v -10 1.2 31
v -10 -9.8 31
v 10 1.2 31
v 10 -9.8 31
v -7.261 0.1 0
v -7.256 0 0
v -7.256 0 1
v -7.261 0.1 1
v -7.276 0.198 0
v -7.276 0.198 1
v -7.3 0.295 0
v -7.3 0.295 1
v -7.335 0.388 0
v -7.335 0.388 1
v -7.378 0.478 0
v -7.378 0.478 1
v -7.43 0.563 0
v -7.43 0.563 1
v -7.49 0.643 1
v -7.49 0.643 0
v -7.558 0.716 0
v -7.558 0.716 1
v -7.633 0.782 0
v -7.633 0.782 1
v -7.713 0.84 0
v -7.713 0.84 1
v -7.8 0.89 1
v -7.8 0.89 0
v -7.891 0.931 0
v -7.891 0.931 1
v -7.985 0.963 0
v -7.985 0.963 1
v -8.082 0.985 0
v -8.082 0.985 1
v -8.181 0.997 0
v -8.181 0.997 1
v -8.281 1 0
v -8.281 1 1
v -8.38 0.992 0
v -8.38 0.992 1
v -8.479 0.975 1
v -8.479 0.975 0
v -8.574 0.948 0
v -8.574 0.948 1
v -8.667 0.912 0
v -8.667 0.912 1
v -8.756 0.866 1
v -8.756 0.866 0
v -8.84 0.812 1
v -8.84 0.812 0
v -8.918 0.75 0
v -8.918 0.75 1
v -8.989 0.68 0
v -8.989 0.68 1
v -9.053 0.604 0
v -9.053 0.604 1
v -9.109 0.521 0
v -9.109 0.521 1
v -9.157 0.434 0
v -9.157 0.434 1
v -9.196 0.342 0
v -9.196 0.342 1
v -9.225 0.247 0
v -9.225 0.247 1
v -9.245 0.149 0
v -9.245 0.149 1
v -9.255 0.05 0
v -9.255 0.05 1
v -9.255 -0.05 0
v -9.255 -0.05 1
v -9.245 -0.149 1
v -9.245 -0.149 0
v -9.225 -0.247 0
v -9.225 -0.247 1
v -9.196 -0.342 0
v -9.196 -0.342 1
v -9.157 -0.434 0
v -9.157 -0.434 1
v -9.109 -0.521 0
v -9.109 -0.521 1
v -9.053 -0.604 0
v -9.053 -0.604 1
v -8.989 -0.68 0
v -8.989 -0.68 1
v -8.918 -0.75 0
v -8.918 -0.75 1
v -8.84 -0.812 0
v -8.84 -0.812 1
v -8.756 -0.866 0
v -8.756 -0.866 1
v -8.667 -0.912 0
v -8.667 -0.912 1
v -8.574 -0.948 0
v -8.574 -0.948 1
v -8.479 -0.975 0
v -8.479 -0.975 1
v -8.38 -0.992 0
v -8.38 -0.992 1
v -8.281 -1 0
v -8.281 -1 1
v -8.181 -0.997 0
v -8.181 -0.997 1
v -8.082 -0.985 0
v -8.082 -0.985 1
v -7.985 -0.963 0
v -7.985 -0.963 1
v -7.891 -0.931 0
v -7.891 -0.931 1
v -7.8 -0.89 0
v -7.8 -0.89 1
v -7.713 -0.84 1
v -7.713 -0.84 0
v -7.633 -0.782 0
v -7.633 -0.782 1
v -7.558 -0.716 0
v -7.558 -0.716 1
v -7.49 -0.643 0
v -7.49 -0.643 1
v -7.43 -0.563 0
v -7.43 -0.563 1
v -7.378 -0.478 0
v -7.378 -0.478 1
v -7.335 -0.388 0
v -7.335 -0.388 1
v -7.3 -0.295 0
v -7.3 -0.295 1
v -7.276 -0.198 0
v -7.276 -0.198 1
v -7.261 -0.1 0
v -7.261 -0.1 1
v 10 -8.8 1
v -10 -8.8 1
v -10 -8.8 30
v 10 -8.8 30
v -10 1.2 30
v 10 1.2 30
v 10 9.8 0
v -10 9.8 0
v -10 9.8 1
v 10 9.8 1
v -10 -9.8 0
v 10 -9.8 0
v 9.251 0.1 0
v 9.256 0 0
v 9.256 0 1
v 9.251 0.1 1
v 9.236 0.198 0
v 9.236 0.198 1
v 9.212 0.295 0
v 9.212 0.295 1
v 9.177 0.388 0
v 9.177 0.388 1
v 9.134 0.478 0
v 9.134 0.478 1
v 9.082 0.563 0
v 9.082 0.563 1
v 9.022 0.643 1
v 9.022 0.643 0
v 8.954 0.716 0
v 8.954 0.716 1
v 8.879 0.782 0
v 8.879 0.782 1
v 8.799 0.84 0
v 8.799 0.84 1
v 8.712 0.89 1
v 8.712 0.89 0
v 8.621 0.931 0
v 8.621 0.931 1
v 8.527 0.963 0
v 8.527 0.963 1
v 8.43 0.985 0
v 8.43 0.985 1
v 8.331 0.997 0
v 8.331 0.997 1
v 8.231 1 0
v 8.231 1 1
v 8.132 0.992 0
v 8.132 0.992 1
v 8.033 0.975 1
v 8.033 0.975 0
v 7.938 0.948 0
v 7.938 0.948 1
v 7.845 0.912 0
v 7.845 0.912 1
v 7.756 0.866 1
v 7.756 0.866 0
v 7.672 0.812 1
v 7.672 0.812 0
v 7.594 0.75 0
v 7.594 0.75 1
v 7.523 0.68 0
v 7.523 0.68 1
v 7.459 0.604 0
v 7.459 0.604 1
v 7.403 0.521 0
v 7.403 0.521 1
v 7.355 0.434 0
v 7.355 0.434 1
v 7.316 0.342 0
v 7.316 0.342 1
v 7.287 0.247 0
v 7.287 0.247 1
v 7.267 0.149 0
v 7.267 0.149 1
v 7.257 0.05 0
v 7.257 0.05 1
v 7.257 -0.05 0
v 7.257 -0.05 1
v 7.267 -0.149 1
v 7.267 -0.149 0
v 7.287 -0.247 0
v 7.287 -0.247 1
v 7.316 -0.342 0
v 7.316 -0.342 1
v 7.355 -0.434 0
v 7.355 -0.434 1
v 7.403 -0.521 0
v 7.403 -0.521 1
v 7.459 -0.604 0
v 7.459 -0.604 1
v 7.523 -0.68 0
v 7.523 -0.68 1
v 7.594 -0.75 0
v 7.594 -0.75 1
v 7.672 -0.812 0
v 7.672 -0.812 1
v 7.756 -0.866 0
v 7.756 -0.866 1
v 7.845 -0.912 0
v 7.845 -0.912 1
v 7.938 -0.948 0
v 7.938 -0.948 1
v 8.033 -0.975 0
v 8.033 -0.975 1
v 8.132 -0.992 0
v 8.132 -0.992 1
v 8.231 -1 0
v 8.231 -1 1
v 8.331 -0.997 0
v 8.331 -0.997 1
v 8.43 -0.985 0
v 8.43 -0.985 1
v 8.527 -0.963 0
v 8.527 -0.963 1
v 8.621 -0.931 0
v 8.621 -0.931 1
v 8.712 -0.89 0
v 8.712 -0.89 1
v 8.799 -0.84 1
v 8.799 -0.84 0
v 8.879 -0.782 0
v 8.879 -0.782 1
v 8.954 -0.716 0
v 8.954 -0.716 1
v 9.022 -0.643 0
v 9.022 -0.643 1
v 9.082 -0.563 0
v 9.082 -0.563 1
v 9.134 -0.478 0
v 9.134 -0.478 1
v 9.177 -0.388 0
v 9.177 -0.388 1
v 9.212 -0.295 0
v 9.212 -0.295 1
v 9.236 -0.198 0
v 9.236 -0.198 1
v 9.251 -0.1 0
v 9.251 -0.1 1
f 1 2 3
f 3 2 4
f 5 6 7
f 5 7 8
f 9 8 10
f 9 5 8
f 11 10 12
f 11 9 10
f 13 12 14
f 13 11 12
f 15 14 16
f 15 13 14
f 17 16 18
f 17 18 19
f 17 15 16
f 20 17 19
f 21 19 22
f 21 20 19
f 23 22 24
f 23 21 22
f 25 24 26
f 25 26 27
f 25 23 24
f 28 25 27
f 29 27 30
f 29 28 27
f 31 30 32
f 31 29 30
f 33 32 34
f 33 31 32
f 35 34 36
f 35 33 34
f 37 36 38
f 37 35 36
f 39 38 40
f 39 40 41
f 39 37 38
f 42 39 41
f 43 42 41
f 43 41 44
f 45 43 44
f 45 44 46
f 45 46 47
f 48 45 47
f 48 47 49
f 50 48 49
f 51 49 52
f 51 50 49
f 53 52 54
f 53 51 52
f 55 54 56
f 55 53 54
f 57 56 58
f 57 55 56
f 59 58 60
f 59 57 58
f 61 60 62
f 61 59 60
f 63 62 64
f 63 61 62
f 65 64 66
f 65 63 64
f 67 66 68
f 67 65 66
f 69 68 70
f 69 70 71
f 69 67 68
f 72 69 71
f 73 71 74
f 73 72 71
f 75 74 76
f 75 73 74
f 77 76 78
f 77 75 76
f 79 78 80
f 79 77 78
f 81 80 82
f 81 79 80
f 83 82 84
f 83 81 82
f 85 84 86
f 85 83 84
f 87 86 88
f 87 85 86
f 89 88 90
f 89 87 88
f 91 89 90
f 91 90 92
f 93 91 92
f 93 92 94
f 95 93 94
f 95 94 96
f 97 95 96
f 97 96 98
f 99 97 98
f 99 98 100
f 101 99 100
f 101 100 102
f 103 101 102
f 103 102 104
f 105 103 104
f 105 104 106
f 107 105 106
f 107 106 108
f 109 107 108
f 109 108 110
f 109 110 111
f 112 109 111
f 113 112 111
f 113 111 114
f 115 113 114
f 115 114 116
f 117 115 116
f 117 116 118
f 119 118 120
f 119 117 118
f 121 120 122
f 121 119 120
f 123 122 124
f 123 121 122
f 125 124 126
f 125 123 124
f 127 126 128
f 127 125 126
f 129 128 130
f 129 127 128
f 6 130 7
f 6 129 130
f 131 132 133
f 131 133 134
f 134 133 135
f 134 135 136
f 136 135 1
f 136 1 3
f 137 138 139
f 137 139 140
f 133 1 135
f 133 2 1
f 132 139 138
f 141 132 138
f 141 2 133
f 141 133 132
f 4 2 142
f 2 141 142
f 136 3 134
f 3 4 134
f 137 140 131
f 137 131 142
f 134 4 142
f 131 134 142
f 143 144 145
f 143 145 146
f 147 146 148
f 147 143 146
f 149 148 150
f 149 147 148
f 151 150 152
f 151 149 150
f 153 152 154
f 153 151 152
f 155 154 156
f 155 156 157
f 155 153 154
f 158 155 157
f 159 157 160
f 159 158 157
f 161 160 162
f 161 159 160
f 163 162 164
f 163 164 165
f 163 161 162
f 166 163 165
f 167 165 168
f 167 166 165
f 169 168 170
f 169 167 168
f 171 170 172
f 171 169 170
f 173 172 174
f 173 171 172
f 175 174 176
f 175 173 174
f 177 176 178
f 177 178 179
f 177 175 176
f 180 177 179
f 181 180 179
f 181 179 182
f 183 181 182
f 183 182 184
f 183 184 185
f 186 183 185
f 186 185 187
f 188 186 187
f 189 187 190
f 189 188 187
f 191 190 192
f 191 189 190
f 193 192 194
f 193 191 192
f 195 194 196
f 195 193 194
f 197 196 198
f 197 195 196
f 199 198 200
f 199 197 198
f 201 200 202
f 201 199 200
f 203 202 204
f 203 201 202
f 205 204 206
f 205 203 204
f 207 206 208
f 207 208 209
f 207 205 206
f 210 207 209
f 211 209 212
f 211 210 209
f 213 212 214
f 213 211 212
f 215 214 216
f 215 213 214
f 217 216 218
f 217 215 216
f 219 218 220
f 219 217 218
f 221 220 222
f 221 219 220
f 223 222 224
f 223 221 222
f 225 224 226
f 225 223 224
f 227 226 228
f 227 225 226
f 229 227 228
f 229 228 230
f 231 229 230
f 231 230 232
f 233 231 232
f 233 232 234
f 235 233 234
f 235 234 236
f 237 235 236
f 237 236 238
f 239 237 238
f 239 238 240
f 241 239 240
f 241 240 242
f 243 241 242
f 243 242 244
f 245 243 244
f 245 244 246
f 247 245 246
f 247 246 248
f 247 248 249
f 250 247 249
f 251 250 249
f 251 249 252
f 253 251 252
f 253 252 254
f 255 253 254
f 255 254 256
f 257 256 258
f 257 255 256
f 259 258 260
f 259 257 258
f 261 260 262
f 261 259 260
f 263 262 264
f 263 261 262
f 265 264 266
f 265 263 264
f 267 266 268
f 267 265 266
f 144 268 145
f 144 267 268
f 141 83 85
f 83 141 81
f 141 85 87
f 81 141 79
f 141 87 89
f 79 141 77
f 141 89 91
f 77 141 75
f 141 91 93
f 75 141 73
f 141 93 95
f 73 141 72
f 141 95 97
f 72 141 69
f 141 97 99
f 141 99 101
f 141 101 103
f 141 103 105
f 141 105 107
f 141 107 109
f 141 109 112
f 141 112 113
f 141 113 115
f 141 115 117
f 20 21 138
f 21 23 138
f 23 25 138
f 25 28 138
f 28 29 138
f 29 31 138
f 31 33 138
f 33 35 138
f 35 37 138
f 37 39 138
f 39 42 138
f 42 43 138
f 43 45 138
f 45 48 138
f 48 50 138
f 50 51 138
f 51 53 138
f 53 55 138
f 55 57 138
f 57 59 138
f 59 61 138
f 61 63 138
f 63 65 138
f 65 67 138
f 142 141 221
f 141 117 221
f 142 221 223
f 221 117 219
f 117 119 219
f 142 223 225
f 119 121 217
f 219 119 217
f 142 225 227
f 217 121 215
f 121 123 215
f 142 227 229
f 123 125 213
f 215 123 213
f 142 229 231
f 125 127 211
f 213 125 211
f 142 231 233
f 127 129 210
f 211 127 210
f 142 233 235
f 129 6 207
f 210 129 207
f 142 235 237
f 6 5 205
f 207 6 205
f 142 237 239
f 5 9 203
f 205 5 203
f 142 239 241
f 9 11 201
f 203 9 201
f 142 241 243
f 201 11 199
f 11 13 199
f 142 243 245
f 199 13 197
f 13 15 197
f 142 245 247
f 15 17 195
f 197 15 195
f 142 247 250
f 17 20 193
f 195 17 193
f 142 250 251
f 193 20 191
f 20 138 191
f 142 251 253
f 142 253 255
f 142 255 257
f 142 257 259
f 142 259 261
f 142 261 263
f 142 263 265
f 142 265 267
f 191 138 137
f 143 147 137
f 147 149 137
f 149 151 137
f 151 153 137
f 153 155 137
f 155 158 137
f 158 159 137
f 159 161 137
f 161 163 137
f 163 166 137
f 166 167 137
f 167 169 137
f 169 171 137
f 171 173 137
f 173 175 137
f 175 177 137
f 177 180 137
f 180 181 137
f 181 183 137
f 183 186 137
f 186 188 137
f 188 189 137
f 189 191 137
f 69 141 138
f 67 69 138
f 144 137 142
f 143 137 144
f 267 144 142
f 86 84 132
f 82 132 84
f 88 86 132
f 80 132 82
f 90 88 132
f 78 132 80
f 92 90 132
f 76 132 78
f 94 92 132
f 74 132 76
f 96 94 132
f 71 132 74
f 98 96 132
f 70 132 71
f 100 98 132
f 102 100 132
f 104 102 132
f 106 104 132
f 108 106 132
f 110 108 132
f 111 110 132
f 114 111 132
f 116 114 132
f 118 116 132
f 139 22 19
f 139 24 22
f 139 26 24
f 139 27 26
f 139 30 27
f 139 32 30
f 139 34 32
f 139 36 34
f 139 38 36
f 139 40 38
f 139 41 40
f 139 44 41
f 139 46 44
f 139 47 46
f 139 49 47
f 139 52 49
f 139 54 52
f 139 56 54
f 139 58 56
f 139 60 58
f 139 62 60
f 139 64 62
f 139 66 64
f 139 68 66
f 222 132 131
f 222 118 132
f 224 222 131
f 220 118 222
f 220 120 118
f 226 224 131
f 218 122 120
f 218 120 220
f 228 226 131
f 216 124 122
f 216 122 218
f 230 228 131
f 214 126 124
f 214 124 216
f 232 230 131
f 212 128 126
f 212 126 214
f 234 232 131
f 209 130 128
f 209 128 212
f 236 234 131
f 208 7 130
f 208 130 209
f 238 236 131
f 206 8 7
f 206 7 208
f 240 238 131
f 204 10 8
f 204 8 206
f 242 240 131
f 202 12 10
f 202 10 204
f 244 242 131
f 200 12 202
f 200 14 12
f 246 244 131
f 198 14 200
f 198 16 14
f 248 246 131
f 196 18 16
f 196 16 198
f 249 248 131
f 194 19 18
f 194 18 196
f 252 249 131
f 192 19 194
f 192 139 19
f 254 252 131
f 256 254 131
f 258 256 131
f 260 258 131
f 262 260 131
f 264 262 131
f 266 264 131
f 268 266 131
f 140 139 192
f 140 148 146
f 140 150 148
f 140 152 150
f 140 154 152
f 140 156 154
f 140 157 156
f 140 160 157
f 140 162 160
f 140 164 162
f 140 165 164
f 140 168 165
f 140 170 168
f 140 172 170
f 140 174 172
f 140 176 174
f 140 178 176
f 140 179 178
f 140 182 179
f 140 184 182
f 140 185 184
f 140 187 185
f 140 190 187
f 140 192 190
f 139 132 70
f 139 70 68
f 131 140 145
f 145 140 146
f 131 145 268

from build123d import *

# Parameters (mm, degrees)
SKETCH1_W           = 20
SKETCH1_H           = 19.6
SKETCH1_R           = 1
BOSS_EXTRUDE1_DEPTH = 1
SKETCH2_W           = 20
SKETCH2_H           = 1
BOSS_EXTRUDE2_DEPTH = 30
SKETCH3_W           = 20
SKETCH3_H           = 1
BOSS_EXTRUDE3_DEPTH = 10


with BuildPart() as part:
    # Sketch1 → Boss-Extrude1 (new body)
    with BuildSketch(Plane.XY):
        Rectangle(SKETCH1_W, SKETCH1_H)
        with Locations((-8.256, 0)):
            Circle(SKETCH1_R, mode=Mode.SUBTRACT)
        with Locations((8.256, 0)):
            Circle(SKETCH1_R, mode=Mode.SUBTRACT)
    extrude(amount=BOSS_EXTRUDE1_DEPTH)

    # Sketch2 → Boss-Extrude2 (add)
    with BuildSketch(Plane.XY.offset(1)):
        with Locations((0, -9.3)):
            Rectangle(SKETCH2_W, SKETCH2_H)
    extrude(amount=BOSS_EXTRUDE2_DEPTH)

    # Sketch3 → Boss-Extrude3 (add)
    with BuildSketch(Plane(origin=(0, -8.8, 0), x_dir=(1, 0, 0), z_dir=(0, 1, 0))):
        with Locations((0, -30.5)):
            Rectangle(SKETCH3_W, SKETCH3_H)
    extrude(amount=BOSS_EXTRUDE3_DEPTH)


solid = part.part
